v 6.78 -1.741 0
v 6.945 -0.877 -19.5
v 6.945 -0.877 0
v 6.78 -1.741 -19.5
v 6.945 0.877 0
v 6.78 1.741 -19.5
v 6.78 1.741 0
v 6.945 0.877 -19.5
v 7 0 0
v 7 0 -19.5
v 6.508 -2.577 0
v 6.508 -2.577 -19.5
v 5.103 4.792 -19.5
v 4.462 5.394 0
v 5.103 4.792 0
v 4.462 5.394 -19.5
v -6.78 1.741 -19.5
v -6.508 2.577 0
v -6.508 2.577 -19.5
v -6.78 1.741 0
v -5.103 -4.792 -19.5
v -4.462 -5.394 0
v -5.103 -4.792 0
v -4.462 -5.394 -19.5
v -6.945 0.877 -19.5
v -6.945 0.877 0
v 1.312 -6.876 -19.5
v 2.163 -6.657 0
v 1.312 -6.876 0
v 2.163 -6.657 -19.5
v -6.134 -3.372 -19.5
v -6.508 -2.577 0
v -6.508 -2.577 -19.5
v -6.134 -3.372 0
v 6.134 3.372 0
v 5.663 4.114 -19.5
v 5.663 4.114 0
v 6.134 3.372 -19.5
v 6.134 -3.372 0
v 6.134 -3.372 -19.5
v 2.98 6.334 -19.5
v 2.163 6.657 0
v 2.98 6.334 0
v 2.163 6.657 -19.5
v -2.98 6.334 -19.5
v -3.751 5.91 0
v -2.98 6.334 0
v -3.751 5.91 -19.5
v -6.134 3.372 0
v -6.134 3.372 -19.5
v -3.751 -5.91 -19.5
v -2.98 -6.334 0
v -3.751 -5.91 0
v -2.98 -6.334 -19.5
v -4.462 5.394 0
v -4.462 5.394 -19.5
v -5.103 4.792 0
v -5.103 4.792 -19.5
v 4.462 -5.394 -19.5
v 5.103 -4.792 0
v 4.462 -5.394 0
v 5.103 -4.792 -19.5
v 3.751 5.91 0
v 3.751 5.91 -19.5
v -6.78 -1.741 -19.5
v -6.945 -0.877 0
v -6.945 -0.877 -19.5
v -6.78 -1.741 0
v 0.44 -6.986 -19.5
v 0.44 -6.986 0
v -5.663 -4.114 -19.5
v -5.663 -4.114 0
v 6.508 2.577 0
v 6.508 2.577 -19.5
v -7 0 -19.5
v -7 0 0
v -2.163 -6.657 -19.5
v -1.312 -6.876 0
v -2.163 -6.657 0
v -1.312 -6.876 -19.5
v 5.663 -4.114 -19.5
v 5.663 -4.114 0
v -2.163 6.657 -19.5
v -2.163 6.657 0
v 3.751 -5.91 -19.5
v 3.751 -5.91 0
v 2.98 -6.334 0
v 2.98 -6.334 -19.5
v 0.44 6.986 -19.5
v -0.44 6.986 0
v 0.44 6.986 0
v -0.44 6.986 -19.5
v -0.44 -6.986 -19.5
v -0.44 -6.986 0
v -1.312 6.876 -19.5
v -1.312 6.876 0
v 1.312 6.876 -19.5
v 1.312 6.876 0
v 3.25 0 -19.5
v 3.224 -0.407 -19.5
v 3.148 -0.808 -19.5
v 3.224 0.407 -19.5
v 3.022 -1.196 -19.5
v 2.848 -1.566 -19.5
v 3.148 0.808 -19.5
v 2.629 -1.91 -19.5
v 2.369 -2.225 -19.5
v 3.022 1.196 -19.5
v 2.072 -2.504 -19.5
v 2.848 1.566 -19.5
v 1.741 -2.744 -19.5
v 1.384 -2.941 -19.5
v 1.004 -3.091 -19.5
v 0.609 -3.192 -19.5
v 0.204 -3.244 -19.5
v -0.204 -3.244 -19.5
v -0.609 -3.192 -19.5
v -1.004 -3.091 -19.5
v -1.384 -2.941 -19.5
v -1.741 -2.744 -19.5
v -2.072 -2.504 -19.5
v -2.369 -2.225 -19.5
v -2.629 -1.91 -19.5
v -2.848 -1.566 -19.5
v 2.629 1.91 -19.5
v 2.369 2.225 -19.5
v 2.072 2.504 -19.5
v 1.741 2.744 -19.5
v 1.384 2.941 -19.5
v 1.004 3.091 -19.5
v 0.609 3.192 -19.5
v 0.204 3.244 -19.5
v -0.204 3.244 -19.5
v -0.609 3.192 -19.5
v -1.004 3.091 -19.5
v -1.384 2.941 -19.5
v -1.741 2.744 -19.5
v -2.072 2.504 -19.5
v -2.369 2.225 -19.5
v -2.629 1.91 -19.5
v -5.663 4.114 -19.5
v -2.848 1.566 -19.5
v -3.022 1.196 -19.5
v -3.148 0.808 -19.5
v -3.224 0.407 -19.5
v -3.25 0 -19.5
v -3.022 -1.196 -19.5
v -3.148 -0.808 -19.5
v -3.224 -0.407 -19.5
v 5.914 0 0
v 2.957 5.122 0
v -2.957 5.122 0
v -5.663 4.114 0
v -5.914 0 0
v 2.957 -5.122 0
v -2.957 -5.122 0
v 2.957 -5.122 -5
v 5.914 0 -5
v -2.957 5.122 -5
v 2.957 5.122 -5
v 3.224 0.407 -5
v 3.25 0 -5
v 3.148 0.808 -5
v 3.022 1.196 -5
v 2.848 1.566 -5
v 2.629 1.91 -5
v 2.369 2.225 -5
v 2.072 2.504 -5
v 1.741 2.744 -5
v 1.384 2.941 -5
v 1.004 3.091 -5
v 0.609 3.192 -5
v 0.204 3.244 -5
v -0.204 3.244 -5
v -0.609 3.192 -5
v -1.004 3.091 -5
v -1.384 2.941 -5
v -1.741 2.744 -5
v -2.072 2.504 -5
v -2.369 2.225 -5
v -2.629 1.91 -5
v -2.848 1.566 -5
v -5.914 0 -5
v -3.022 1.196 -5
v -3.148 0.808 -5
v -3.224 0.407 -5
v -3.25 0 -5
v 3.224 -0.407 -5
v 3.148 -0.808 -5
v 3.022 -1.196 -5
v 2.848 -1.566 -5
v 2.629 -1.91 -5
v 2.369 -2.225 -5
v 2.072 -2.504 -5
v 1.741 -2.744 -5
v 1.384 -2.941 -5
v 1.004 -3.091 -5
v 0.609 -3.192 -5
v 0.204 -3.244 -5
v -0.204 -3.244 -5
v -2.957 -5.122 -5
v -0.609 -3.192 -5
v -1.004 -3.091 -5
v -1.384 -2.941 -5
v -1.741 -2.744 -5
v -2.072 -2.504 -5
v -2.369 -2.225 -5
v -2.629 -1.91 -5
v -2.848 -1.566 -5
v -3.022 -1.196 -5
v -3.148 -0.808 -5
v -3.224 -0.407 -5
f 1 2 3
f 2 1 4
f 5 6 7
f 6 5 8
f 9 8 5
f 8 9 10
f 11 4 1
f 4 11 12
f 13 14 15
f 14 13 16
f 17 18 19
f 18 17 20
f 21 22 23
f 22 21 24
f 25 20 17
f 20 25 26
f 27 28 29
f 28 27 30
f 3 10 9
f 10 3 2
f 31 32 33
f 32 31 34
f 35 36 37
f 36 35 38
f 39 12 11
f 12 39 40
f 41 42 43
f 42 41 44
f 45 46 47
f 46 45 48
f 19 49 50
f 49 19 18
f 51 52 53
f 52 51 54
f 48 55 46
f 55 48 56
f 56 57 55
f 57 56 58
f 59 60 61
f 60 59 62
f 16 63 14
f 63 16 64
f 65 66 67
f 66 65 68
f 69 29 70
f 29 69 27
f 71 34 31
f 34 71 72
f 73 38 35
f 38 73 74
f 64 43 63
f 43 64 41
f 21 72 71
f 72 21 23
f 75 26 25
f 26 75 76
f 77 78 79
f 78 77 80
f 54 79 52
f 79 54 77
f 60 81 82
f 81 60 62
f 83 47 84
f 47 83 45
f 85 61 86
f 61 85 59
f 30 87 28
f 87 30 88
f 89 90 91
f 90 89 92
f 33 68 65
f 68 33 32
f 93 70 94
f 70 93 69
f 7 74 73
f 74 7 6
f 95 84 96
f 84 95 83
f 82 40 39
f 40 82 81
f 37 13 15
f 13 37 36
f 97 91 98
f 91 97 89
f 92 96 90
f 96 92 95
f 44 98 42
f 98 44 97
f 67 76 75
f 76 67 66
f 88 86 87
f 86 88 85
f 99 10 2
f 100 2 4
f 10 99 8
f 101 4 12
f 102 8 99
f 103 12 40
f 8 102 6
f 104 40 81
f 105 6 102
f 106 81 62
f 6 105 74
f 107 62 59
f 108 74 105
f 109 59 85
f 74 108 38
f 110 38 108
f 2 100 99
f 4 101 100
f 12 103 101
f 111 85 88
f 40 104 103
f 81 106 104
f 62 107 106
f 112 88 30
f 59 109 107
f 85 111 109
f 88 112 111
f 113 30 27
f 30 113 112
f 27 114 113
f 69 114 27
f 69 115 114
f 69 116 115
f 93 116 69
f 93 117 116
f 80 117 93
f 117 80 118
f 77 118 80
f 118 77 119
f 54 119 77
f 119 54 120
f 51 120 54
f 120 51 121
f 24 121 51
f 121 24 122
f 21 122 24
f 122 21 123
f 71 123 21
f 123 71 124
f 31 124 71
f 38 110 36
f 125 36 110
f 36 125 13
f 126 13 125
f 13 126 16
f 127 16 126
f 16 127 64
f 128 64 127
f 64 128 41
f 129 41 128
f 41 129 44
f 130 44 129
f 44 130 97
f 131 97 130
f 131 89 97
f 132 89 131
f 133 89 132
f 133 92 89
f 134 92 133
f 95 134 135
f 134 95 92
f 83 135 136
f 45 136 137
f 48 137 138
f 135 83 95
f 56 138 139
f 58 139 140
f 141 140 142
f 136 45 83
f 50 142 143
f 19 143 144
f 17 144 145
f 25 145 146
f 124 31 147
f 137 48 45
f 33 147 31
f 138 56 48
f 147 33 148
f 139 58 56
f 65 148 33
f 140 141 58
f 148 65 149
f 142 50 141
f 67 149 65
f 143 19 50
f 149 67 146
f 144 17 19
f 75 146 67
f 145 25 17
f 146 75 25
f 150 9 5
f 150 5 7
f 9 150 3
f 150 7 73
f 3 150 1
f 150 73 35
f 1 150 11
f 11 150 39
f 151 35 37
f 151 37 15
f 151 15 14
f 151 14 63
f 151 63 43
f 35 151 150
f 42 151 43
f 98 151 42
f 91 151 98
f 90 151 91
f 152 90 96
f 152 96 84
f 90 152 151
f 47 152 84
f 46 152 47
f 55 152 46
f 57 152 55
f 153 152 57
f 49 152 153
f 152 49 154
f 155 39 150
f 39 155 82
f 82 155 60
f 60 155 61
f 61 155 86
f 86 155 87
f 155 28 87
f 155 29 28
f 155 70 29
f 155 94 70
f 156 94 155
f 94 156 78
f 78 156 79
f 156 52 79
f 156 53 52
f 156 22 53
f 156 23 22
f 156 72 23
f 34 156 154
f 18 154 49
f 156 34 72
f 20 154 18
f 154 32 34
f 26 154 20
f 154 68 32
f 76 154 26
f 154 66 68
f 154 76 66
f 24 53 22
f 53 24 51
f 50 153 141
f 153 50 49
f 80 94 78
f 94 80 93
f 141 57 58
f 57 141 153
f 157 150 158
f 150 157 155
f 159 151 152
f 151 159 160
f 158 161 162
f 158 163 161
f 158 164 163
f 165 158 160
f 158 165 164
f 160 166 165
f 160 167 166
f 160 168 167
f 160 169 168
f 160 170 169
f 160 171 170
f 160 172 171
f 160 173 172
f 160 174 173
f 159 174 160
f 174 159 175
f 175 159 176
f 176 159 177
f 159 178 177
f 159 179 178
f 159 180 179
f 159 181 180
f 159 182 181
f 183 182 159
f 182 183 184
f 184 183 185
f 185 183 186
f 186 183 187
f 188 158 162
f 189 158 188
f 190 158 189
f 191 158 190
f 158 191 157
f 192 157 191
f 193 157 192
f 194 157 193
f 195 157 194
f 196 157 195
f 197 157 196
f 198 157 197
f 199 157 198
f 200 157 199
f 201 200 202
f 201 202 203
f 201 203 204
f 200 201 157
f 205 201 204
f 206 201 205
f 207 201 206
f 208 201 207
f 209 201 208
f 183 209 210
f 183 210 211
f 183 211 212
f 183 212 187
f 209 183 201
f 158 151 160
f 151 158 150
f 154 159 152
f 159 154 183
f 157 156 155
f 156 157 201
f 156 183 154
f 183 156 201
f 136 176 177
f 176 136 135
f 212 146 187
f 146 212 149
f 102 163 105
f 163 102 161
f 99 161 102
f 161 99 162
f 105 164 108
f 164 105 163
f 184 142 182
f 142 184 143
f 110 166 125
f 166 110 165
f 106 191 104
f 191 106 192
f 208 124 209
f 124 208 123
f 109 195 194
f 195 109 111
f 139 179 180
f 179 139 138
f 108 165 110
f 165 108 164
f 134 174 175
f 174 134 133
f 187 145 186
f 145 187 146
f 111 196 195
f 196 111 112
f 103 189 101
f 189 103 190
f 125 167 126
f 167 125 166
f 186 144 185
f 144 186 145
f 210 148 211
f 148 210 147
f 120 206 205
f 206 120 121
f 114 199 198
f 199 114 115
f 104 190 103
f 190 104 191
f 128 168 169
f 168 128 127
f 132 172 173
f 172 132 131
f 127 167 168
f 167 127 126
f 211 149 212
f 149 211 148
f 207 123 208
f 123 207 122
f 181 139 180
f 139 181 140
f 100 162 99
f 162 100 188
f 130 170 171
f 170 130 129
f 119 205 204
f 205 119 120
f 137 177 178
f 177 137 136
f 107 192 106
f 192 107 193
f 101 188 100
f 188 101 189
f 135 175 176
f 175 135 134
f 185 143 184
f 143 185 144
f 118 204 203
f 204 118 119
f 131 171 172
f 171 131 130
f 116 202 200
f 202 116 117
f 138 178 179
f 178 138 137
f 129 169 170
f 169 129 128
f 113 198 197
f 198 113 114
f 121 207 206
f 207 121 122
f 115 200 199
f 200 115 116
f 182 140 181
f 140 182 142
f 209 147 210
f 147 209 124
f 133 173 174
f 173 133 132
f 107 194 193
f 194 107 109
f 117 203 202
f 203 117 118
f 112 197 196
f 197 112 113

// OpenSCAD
$fn = 50;


difference() {
	union() {
		translate(v = [0, 0, -19.5000000000]) {
			cylinder(h = 19.5000000000, r = 7.0000000000);
		}
		#translate(v = [0, 0, -21.0000000000]) {
			cylinder(h = 21, r = 2.8750000000);
		}
	}
	union() {
		translate(v = [0, 0, 0]) {
			rotate(a = [0, 0, 0]) {
				difference() {
					union() {
						translate(v = [0, 0, -5]) {
							linear_extrude(height = 5) {
								polygon(points = [[5.9142500000, 0.0000000000], [2.9571250000, 5.1218907443], [-2.9571250000, 5.1218907443], [-5.9142500000, 0.0000000000], [-2.9571250000, -5.1218907443], [2.9571250000, -5.1218907443]]);
							}
						}
					}
					union();
				}
			}
		}
		#translate(v = [0, 0, -100.0000000000]) {
			cylinder(h = 200, r = 3.2500000000);
		}
	}
}
